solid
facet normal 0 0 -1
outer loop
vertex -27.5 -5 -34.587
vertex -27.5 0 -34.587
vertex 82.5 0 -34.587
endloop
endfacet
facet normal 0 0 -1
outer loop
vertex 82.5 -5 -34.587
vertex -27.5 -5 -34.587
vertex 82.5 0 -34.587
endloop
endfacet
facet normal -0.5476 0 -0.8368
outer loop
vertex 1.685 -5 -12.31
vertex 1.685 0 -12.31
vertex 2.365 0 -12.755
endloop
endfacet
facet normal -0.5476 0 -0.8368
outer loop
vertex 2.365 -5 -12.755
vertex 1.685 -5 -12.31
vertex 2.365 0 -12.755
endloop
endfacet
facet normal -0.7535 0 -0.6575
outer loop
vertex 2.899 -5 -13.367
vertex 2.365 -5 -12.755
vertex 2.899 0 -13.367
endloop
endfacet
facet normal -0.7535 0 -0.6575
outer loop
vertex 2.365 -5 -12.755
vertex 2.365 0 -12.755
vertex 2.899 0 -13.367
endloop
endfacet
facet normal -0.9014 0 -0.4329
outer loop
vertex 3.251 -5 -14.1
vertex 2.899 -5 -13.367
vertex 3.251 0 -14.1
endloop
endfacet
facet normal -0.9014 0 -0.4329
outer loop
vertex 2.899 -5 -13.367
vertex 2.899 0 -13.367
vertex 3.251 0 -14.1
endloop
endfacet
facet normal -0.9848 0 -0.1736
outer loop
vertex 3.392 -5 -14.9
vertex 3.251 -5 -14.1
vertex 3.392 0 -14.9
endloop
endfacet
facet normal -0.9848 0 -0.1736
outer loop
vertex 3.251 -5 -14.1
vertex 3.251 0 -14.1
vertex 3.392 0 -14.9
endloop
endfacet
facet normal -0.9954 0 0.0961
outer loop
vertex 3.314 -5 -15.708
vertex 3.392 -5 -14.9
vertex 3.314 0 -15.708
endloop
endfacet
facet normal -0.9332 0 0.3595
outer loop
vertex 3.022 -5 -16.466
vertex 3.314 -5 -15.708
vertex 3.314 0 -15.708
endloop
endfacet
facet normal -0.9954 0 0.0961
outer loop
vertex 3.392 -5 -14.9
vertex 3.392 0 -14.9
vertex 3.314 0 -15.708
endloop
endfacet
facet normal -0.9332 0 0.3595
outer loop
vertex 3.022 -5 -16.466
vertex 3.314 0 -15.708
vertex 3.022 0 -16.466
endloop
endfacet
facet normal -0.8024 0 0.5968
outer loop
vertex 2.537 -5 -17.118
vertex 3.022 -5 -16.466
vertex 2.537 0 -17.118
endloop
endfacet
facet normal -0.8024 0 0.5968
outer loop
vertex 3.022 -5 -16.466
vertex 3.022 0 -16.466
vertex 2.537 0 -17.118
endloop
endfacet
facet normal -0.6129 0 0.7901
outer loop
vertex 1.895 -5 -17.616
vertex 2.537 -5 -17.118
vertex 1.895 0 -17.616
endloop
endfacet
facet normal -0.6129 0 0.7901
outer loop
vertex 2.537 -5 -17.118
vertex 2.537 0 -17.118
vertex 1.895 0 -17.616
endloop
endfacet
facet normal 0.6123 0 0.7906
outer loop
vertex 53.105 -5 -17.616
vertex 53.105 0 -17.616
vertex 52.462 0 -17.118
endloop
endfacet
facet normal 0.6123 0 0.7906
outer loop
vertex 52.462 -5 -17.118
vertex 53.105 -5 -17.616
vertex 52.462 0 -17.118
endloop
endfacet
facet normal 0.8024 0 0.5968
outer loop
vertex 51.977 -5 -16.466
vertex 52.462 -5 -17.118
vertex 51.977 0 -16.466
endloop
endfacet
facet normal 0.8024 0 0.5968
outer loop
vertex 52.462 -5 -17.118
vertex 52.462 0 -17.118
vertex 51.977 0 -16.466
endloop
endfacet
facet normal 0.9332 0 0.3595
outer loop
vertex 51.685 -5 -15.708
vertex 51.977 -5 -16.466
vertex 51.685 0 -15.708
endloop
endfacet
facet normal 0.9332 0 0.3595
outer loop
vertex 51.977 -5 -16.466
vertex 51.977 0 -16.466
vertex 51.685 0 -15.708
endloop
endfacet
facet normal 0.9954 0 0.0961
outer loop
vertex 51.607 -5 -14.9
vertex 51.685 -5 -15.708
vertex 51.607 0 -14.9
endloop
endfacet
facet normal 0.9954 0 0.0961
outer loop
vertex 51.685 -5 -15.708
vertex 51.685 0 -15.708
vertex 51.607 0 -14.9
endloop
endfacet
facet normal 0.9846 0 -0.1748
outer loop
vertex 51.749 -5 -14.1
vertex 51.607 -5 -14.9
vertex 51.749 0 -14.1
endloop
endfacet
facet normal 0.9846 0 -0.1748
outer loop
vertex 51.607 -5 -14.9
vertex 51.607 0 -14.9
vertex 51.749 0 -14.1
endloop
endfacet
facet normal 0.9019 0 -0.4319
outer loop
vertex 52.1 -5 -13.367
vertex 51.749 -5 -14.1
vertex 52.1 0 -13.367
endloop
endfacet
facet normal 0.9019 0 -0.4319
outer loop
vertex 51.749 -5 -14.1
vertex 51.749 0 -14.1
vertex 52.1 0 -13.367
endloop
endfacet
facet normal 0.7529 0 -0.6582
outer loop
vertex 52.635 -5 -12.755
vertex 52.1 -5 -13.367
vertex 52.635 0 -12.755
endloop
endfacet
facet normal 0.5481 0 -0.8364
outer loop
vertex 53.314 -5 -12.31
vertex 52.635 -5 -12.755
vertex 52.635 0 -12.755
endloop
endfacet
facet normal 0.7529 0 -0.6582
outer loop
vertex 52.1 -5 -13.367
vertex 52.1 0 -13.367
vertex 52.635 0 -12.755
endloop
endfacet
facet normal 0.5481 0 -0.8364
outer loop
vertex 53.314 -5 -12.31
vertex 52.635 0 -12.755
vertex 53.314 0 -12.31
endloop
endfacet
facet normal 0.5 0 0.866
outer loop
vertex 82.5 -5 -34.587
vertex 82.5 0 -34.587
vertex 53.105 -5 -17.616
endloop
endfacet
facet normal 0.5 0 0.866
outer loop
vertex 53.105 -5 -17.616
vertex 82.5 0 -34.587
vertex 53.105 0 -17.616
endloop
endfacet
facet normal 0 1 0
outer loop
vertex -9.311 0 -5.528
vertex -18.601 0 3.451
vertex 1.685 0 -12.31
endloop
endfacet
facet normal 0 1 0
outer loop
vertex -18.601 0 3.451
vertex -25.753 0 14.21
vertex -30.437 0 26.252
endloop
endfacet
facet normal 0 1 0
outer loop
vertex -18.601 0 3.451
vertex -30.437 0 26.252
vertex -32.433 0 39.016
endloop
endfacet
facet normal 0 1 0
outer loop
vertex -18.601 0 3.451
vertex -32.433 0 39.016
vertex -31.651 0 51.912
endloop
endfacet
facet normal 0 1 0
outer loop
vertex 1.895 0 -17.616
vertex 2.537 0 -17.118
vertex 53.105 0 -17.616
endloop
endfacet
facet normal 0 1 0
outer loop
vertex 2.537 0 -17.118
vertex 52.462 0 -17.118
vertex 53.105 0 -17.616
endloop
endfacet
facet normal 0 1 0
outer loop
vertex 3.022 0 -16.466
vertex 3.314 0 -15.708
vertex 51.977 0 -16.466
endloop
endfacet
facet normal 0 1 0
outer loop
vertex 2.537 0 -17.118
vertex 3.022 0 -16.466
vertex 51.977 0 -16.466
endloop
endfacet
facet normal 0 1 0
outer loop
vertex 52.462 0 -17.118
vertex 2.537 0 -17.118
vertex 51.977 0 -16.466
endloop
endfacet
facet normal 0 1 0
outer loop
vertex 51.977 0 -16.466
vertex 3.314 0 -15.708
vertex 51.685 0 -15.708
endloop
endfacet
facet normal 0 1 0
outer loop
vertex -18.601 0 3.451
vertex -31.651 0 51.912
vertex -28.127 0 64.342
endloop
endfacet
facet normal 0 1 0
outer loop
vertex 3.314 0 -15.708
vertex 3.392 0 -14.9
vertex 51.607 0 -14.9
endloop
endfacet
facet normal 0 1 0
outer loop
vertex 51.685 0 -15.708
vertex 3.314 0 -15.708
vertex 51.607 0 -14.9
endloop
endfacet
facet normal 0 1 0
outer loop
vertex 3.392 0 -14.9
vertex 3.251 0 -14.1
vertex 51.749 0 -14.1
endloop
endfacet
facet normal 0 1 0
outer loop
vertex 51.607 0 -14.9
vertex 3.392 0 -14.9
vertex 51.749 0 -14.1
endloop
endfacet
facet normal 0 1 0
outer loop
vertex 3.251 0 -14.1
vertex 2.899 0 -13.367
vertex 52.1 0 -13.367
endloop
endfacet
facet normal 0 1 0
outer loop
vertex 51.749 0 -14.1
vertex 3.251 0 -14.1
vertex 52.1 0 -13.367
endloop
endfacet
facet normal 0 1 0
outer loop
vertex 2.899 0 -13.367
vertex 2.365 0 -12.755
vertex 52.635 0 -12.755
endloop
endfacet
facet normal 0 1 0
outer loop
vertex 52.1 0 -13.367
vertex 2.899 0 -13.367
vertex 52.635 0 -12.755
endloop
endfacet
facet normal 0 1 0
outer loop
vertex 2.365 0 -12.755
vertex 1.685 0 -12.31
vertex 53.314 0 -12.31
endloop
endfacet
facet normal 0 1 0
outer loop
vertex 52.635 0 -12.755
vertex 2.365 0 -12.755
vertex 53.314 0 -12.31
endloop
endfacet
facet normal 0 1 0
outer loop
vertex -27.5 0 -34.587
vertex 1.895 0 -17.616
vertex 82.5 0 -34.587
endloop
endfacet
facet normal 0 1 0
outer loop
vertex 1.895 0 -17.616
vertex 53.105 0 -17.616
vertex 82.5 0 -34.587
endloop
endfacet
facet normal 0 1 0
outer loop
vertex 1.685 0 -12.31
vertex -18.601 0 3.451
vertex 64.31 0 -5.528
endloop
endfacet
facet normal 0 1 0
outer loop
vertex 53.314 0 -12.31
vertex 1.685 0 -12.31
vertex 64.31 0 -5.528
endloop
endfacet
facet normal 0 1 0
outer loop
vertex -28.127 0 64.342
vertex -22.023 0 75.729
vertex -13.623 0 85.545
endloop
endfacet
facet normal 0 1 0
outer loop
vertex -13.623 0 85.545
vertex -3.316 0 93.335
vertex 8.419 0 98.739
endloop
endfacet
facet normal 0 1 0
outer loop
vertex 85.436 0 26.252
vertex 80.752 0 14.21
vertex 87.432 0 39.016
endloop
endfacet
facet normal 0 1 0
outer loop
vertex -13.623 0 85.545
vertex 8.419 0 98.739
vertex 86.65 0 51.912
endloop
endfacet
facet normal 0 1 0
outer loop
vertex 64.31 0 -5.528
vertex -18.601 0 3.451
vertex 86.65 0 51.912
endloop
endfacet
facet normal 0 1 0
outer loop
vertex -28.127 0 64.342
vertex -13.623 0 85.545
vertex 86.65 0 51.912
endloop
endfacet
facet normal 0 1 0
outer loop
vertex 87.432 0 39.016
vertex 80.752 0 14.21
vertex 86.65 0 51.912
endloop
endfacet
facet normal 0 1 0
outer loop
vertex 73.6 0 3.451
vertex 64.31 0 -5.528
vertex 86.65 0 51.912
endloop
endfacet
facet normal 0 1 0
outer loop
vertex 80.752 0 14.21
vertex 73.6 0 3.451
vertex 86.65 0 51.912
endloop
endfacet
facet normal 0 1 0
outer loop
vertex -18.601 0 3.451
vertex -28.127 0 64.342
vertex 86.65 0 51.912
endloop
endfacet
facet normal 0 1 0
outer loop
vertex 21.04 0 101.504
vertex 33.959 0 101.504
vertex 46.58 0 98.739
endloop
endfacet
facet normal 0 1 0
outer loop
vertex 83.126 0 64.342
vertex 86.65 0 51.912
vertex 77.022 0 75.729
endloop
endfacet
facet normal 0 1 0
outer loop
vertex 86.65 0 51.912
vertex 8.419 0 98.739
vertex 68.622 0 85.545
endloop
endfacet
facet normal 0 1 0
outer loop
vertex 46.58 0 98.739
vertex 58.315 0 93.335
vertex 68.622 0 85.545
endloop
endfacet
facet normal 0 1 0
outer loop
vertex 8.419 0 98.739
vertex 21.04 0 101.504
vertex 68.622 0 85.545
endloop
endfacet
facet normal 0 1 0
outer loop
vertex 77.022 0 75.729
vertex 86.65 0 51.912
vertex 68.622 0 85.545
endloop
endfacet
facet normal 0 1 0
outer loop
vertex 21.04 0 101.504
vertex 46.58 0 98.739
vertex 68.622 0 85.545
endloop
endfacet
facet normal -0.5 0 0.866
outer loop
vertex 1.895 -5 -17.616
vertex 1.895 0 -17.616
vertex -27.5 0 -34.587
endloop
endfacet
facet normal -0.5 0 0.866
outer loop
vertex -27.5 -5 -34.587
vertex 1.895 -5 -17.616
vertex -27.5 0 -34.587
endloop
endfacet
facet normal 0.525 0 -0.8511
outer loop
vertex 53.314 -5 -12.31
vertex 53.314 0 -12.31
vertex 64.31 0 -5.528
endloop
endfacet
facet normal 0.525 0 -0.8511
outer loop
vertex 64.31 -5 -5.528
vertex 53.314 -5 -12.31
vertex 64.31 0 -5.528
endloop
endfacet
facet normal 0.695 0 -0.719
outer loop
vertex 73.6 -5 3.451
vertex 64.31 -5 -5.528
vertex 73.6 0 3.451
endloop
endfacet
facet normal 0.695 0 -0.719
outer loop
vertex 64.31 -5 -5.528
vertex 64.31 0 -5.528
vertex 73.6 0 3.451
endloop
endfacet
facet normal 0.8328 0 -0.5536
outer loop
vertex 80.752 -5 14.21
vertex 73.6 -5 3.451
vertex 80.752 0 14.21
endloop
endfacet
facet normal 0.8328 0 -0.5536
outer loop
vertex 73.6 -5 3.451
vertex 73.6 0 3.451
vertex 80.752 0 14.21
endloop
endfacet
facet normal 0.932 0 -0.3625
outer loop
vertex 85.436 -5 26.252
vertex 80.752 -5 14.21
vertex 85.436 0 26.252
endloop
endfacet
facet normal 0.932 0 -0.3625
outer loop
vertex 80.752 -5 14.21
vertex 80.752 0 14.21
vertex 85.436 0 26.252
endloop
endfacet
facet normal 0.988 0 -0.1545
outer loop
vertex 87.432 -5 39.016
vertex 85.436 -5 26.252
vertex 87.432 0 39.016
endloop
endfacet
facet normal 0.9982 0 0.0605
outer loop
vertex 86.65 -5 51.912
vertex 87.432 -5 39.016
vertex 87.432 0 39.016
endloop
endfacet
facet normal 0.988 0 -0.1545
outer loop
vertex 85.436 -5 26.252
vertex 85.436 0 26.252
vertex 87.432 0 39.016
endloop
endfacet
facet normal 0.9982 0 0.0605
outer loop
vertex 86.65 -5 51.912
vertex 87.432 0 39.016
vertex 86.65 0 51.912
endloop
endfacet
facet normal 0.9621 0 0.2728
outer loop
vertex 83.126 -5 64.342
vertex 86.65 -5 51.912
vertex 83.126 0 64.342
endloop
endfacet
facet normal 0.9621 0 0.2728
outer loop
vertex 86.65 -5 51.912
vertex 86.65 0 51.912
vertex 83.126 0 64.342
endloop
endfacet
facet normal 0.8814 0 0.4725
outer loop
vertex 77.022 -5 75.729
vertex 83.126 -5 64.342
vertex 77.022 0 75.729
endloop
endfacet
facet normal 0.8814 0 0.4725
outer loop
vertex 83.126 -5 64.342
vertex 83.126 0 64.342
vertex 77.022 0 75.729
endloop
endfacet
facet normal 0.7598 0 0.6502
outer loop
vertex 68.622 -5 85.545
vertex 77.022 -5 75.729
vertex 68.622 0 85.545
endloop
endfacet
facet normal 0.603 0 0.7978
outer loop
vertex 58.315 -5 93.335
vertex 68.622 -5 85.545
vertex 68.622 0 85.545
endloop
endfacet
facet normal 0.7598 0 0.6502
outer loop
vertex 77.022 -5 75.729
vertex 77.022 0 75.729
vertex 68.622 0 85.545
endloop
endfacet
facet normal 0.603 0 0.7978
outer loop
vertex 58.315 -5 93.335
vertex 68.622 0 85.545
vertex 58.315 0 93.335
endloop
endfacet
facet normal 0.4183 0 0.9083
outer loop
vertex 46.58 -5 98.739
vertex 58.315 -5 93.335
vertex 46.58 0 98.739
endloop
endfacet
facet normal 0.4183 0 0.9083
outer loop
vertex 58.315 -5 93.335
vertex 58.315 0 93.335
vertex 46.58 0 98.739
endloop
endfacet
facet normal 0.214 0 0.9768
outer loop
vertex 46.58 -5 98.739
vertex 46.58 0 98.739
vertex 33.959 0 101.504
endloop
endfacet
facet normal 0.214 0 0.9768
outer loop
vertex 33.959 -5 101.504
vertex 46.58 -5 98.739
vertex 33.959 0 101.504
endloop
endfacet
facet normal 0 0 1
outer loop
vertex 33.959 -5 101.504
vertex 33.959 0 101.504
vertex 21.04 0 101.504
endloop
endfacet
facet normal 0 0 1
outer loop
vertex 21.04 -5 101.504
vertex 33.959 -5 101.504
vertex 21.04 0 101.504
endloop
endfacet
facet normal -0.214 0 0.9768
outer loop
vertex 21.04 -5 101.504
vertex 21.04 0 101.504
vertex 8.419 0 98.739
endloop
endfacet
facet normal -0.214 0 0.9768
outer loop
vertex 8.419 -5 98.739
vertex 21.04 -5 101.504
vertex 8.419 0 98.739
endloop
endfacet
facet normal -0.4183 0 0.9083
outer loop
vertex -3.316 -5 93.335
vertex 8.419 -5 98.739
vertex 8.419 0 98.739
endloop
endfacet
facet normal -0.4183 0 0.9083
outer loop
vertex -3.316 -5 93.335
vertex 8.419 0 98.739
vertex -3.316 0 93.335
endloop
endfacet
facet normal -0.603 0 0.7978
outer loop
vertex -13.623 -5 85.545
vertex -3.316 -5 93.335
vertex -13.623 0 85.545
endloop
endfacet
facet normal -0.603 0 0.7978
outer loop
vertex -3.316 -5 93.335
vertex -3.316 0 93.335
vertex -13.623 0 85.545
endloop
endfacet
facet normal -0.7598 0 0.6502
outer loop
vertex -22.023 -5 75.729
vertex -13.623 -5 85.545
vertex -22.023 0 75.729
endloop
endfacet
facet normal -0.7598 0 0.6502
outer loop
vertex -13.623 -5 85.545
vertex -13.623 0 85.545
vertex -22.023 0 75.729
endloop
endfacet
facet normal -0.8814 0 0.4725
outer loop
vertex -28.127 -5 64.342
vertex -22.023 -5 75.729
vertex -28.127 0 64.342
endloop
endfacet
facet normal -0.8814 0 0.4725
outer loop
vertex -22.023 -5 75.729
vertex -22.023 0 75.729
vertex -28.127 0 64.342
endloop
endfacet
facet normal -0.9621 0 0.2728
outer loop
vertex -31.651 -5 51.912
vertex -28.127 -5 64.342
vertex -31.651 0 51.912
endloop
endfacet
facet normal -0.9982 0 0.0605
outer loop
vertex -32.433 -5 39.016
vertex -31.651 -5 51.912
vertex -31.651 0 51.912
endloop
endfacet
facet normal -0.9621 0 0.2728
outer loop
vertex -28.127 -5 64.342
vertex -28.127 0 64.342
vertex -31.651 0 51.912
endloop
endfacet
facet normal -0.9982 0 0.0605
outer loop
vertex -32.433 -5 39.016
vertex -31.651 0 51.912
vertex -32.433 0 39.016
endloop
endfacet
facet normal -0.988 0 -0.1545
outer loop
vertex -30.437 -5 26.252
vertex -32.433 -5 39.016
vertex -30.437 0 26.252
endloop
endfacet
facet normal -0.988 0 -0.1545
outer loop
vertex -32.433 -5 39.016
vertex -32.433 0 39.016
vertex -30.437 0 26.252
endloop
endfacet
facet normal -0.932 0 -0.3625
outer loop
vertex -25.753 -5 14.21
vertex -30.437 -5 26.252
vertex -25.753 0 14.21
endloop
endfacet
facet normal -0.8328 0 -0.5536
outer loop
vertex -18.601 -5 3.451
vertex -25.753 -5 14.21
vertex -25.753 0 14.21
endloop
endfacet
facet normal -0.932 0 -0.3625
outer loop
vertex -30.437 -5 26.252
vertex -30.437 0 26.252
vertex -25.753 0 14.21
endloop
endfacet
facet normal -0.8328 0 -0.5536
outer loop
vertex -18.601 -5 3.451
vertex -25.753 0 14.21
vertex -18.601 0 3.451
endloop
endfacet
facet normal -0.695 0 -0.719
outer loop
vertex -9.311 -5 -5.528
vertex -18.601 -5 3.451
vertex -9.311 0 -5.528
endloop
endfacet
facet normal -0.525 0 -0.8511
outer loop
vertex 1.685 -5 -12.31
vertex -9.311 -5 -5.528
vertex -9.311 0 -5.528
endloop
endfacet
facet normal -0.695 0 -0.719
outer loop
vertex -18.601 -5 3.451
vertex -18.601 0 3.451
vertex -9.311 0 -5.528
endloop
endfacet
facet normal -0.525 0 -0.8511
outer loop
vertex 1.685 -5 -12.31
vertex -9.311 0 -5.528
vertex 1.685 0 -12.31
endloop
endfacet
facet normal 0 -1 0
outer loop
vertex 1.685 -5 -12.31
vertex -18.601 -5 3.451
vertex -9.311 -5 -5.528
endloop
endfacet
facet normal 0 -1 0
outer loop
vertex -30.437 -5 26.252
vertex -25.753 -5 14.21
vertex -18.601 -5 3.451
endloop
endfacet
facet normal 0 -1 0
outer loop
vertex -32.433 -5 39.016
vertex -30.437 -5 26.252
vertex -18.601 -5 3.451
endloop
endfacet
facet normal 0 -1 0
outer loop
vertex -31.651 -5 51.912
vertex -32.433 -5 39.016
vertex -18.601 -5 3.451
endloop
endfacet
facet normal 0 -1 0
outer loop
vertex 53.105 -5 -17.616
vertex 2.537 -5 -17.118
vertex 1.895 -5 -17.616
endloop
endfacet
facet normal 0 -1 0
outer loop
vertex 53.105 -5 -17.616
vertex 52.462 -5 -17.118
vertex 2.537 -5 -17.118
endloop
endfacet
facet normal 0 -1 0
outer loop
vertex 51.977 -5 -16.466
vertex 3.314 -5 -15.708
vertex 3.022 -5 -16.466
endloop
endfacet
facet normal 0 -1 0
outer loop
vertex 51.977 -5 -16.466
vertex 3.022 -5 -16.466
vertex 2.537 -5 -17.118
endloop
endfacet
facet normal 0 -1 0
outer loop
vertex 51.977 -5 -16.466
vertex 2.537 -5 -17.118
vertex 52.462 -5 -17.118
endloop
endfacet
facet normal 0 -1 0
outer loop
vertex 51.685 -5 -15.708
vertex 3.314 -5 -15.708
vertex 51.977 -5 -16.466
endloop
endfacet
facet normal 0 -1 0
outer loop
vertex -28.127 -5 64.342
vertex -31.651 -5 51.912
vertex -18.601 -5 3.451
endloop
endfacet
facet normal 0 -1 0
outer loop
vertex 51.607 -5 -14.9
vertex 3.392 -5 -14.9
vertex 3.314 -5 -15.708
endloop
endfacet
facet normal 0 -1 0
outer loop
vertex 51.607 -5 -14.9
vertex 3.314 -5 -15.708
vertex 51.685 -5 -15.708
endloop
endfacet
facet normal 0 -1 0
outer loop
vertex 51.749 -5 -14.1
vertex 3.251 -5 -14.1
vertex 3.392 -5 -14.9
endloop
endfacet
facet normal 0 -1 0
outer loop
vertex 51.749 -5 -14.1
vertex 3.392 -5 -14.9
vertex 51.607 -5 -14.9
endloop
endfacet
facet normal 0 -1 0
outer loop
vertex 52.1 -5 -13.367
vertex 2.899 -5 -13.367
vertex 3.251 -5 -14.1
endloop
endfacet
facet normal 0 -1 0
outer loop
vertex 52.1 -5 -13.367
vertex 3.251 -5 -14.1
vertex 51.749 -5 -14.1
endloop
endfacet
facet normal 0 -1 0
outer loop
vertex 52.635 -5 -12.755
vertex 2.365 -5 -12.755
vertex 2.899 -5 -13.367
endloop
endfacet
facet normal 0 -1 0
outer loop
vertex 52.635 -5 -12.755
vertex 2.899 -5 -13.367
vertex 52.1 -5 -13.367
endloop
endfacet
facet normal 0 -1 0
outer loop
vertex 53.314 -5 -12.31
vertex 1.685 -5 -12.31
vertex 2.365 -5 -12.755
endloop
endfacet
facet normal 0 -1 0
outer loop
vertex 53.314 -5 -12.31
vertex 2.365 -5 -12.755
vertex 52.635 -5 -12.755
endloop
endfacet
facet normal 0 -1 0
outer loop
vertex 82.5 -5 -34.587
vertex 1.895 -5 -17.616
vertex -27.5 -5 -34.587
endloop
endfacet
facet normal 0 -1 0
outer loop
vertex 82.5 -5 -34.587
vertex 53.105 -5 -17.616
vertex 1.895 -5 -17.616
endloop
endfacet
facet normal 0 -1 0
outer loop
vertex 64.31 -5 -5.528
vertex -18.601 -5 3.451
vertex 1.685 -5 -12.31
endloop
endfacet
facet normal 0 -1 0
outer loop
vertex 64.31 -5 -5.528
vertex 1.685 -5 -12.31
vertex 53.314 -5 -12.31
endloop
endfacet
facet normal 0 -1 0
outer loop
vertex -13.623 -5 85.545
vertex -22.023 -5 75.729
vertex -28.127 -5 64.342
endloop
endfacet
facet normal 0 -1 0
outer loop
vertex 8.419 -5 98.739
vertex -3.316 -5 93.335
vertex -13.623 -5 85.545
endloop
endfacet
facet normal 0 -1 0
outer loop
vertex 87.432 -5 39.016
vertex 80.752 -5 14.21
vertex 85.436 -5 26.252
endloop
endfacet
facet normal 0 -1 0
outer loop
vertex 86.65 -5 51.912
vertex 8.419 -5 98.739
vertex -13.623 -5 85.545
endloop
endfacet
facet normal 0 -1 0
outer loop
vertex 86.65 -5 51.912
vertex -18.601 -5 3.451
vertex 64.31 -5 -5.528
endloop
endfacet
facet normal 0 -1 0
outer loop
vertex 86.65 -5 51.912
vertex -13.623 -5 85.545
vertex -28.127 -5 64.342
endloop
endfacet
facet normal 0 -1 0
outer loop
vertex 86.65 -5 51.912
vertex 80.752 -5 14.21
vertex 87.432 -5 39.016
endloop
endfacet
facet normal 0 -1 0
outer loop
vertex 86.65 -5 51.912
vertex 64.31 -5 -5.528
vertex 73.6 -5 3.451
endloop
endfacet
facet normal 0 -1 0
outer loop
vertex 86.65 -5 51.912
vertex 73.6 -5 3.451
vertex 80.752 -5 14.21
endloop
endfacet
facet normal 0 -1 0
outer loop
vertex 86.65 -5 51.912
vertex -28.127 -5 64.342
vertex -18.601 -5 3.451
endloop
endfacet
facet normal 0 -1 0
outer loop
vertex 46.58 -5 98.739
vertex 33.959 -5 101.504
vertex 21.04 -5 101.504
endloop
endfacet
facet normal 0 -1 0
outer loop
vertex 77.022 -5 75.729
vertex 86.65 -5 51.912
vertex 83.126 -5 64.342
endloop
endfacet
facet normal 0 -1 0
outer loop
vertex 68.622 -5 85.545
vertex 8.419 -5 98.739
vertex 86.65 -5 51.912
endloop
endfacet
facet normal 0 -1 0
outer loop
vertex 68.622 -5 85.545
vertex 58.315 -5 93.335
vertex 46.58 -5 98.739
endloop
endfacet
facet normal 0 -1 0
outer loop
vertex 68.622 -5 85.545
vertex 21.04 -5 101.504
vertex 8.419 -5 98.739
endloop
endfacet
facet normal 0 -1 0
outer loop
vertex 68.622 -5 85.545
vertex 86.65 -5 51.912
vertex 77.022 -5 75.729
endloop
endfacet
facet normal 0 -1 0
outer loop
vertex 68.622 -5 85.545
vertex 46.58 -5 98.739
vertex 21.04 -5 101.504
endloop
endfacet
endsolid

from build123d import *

# Parameters (mm, degrees)
F1_DEPTH = 5


with BuildPart() as f1:
    # F0 (on Front) → F1 (new body)
    with BuildSketch(Plane.XZ):
        with BuildLine():
            Line((1.894506, -17.615913), (-27.500473, -34.587112))
            Line((-27.500473, -34.587112), (82.499527, -34.587112))
            Line((82.499527, -34.587112), (53.104548, -17.615913))
            ThreePointArc((53.104548, -17.615913), (51.606879, -14.899604), (53.313833, -12.309691))
            ThreePointArc((53.313833, -12.309691), (27.499527, 101.853226), (1.685221, -12.309691))
            ThreePointArc((1.685221, -12.309691), (3.392175, -14.899604), (1.894506, -17.615913))
        make_face()
    extrude(amount=F1_DEPTH)


solid = f1.part
